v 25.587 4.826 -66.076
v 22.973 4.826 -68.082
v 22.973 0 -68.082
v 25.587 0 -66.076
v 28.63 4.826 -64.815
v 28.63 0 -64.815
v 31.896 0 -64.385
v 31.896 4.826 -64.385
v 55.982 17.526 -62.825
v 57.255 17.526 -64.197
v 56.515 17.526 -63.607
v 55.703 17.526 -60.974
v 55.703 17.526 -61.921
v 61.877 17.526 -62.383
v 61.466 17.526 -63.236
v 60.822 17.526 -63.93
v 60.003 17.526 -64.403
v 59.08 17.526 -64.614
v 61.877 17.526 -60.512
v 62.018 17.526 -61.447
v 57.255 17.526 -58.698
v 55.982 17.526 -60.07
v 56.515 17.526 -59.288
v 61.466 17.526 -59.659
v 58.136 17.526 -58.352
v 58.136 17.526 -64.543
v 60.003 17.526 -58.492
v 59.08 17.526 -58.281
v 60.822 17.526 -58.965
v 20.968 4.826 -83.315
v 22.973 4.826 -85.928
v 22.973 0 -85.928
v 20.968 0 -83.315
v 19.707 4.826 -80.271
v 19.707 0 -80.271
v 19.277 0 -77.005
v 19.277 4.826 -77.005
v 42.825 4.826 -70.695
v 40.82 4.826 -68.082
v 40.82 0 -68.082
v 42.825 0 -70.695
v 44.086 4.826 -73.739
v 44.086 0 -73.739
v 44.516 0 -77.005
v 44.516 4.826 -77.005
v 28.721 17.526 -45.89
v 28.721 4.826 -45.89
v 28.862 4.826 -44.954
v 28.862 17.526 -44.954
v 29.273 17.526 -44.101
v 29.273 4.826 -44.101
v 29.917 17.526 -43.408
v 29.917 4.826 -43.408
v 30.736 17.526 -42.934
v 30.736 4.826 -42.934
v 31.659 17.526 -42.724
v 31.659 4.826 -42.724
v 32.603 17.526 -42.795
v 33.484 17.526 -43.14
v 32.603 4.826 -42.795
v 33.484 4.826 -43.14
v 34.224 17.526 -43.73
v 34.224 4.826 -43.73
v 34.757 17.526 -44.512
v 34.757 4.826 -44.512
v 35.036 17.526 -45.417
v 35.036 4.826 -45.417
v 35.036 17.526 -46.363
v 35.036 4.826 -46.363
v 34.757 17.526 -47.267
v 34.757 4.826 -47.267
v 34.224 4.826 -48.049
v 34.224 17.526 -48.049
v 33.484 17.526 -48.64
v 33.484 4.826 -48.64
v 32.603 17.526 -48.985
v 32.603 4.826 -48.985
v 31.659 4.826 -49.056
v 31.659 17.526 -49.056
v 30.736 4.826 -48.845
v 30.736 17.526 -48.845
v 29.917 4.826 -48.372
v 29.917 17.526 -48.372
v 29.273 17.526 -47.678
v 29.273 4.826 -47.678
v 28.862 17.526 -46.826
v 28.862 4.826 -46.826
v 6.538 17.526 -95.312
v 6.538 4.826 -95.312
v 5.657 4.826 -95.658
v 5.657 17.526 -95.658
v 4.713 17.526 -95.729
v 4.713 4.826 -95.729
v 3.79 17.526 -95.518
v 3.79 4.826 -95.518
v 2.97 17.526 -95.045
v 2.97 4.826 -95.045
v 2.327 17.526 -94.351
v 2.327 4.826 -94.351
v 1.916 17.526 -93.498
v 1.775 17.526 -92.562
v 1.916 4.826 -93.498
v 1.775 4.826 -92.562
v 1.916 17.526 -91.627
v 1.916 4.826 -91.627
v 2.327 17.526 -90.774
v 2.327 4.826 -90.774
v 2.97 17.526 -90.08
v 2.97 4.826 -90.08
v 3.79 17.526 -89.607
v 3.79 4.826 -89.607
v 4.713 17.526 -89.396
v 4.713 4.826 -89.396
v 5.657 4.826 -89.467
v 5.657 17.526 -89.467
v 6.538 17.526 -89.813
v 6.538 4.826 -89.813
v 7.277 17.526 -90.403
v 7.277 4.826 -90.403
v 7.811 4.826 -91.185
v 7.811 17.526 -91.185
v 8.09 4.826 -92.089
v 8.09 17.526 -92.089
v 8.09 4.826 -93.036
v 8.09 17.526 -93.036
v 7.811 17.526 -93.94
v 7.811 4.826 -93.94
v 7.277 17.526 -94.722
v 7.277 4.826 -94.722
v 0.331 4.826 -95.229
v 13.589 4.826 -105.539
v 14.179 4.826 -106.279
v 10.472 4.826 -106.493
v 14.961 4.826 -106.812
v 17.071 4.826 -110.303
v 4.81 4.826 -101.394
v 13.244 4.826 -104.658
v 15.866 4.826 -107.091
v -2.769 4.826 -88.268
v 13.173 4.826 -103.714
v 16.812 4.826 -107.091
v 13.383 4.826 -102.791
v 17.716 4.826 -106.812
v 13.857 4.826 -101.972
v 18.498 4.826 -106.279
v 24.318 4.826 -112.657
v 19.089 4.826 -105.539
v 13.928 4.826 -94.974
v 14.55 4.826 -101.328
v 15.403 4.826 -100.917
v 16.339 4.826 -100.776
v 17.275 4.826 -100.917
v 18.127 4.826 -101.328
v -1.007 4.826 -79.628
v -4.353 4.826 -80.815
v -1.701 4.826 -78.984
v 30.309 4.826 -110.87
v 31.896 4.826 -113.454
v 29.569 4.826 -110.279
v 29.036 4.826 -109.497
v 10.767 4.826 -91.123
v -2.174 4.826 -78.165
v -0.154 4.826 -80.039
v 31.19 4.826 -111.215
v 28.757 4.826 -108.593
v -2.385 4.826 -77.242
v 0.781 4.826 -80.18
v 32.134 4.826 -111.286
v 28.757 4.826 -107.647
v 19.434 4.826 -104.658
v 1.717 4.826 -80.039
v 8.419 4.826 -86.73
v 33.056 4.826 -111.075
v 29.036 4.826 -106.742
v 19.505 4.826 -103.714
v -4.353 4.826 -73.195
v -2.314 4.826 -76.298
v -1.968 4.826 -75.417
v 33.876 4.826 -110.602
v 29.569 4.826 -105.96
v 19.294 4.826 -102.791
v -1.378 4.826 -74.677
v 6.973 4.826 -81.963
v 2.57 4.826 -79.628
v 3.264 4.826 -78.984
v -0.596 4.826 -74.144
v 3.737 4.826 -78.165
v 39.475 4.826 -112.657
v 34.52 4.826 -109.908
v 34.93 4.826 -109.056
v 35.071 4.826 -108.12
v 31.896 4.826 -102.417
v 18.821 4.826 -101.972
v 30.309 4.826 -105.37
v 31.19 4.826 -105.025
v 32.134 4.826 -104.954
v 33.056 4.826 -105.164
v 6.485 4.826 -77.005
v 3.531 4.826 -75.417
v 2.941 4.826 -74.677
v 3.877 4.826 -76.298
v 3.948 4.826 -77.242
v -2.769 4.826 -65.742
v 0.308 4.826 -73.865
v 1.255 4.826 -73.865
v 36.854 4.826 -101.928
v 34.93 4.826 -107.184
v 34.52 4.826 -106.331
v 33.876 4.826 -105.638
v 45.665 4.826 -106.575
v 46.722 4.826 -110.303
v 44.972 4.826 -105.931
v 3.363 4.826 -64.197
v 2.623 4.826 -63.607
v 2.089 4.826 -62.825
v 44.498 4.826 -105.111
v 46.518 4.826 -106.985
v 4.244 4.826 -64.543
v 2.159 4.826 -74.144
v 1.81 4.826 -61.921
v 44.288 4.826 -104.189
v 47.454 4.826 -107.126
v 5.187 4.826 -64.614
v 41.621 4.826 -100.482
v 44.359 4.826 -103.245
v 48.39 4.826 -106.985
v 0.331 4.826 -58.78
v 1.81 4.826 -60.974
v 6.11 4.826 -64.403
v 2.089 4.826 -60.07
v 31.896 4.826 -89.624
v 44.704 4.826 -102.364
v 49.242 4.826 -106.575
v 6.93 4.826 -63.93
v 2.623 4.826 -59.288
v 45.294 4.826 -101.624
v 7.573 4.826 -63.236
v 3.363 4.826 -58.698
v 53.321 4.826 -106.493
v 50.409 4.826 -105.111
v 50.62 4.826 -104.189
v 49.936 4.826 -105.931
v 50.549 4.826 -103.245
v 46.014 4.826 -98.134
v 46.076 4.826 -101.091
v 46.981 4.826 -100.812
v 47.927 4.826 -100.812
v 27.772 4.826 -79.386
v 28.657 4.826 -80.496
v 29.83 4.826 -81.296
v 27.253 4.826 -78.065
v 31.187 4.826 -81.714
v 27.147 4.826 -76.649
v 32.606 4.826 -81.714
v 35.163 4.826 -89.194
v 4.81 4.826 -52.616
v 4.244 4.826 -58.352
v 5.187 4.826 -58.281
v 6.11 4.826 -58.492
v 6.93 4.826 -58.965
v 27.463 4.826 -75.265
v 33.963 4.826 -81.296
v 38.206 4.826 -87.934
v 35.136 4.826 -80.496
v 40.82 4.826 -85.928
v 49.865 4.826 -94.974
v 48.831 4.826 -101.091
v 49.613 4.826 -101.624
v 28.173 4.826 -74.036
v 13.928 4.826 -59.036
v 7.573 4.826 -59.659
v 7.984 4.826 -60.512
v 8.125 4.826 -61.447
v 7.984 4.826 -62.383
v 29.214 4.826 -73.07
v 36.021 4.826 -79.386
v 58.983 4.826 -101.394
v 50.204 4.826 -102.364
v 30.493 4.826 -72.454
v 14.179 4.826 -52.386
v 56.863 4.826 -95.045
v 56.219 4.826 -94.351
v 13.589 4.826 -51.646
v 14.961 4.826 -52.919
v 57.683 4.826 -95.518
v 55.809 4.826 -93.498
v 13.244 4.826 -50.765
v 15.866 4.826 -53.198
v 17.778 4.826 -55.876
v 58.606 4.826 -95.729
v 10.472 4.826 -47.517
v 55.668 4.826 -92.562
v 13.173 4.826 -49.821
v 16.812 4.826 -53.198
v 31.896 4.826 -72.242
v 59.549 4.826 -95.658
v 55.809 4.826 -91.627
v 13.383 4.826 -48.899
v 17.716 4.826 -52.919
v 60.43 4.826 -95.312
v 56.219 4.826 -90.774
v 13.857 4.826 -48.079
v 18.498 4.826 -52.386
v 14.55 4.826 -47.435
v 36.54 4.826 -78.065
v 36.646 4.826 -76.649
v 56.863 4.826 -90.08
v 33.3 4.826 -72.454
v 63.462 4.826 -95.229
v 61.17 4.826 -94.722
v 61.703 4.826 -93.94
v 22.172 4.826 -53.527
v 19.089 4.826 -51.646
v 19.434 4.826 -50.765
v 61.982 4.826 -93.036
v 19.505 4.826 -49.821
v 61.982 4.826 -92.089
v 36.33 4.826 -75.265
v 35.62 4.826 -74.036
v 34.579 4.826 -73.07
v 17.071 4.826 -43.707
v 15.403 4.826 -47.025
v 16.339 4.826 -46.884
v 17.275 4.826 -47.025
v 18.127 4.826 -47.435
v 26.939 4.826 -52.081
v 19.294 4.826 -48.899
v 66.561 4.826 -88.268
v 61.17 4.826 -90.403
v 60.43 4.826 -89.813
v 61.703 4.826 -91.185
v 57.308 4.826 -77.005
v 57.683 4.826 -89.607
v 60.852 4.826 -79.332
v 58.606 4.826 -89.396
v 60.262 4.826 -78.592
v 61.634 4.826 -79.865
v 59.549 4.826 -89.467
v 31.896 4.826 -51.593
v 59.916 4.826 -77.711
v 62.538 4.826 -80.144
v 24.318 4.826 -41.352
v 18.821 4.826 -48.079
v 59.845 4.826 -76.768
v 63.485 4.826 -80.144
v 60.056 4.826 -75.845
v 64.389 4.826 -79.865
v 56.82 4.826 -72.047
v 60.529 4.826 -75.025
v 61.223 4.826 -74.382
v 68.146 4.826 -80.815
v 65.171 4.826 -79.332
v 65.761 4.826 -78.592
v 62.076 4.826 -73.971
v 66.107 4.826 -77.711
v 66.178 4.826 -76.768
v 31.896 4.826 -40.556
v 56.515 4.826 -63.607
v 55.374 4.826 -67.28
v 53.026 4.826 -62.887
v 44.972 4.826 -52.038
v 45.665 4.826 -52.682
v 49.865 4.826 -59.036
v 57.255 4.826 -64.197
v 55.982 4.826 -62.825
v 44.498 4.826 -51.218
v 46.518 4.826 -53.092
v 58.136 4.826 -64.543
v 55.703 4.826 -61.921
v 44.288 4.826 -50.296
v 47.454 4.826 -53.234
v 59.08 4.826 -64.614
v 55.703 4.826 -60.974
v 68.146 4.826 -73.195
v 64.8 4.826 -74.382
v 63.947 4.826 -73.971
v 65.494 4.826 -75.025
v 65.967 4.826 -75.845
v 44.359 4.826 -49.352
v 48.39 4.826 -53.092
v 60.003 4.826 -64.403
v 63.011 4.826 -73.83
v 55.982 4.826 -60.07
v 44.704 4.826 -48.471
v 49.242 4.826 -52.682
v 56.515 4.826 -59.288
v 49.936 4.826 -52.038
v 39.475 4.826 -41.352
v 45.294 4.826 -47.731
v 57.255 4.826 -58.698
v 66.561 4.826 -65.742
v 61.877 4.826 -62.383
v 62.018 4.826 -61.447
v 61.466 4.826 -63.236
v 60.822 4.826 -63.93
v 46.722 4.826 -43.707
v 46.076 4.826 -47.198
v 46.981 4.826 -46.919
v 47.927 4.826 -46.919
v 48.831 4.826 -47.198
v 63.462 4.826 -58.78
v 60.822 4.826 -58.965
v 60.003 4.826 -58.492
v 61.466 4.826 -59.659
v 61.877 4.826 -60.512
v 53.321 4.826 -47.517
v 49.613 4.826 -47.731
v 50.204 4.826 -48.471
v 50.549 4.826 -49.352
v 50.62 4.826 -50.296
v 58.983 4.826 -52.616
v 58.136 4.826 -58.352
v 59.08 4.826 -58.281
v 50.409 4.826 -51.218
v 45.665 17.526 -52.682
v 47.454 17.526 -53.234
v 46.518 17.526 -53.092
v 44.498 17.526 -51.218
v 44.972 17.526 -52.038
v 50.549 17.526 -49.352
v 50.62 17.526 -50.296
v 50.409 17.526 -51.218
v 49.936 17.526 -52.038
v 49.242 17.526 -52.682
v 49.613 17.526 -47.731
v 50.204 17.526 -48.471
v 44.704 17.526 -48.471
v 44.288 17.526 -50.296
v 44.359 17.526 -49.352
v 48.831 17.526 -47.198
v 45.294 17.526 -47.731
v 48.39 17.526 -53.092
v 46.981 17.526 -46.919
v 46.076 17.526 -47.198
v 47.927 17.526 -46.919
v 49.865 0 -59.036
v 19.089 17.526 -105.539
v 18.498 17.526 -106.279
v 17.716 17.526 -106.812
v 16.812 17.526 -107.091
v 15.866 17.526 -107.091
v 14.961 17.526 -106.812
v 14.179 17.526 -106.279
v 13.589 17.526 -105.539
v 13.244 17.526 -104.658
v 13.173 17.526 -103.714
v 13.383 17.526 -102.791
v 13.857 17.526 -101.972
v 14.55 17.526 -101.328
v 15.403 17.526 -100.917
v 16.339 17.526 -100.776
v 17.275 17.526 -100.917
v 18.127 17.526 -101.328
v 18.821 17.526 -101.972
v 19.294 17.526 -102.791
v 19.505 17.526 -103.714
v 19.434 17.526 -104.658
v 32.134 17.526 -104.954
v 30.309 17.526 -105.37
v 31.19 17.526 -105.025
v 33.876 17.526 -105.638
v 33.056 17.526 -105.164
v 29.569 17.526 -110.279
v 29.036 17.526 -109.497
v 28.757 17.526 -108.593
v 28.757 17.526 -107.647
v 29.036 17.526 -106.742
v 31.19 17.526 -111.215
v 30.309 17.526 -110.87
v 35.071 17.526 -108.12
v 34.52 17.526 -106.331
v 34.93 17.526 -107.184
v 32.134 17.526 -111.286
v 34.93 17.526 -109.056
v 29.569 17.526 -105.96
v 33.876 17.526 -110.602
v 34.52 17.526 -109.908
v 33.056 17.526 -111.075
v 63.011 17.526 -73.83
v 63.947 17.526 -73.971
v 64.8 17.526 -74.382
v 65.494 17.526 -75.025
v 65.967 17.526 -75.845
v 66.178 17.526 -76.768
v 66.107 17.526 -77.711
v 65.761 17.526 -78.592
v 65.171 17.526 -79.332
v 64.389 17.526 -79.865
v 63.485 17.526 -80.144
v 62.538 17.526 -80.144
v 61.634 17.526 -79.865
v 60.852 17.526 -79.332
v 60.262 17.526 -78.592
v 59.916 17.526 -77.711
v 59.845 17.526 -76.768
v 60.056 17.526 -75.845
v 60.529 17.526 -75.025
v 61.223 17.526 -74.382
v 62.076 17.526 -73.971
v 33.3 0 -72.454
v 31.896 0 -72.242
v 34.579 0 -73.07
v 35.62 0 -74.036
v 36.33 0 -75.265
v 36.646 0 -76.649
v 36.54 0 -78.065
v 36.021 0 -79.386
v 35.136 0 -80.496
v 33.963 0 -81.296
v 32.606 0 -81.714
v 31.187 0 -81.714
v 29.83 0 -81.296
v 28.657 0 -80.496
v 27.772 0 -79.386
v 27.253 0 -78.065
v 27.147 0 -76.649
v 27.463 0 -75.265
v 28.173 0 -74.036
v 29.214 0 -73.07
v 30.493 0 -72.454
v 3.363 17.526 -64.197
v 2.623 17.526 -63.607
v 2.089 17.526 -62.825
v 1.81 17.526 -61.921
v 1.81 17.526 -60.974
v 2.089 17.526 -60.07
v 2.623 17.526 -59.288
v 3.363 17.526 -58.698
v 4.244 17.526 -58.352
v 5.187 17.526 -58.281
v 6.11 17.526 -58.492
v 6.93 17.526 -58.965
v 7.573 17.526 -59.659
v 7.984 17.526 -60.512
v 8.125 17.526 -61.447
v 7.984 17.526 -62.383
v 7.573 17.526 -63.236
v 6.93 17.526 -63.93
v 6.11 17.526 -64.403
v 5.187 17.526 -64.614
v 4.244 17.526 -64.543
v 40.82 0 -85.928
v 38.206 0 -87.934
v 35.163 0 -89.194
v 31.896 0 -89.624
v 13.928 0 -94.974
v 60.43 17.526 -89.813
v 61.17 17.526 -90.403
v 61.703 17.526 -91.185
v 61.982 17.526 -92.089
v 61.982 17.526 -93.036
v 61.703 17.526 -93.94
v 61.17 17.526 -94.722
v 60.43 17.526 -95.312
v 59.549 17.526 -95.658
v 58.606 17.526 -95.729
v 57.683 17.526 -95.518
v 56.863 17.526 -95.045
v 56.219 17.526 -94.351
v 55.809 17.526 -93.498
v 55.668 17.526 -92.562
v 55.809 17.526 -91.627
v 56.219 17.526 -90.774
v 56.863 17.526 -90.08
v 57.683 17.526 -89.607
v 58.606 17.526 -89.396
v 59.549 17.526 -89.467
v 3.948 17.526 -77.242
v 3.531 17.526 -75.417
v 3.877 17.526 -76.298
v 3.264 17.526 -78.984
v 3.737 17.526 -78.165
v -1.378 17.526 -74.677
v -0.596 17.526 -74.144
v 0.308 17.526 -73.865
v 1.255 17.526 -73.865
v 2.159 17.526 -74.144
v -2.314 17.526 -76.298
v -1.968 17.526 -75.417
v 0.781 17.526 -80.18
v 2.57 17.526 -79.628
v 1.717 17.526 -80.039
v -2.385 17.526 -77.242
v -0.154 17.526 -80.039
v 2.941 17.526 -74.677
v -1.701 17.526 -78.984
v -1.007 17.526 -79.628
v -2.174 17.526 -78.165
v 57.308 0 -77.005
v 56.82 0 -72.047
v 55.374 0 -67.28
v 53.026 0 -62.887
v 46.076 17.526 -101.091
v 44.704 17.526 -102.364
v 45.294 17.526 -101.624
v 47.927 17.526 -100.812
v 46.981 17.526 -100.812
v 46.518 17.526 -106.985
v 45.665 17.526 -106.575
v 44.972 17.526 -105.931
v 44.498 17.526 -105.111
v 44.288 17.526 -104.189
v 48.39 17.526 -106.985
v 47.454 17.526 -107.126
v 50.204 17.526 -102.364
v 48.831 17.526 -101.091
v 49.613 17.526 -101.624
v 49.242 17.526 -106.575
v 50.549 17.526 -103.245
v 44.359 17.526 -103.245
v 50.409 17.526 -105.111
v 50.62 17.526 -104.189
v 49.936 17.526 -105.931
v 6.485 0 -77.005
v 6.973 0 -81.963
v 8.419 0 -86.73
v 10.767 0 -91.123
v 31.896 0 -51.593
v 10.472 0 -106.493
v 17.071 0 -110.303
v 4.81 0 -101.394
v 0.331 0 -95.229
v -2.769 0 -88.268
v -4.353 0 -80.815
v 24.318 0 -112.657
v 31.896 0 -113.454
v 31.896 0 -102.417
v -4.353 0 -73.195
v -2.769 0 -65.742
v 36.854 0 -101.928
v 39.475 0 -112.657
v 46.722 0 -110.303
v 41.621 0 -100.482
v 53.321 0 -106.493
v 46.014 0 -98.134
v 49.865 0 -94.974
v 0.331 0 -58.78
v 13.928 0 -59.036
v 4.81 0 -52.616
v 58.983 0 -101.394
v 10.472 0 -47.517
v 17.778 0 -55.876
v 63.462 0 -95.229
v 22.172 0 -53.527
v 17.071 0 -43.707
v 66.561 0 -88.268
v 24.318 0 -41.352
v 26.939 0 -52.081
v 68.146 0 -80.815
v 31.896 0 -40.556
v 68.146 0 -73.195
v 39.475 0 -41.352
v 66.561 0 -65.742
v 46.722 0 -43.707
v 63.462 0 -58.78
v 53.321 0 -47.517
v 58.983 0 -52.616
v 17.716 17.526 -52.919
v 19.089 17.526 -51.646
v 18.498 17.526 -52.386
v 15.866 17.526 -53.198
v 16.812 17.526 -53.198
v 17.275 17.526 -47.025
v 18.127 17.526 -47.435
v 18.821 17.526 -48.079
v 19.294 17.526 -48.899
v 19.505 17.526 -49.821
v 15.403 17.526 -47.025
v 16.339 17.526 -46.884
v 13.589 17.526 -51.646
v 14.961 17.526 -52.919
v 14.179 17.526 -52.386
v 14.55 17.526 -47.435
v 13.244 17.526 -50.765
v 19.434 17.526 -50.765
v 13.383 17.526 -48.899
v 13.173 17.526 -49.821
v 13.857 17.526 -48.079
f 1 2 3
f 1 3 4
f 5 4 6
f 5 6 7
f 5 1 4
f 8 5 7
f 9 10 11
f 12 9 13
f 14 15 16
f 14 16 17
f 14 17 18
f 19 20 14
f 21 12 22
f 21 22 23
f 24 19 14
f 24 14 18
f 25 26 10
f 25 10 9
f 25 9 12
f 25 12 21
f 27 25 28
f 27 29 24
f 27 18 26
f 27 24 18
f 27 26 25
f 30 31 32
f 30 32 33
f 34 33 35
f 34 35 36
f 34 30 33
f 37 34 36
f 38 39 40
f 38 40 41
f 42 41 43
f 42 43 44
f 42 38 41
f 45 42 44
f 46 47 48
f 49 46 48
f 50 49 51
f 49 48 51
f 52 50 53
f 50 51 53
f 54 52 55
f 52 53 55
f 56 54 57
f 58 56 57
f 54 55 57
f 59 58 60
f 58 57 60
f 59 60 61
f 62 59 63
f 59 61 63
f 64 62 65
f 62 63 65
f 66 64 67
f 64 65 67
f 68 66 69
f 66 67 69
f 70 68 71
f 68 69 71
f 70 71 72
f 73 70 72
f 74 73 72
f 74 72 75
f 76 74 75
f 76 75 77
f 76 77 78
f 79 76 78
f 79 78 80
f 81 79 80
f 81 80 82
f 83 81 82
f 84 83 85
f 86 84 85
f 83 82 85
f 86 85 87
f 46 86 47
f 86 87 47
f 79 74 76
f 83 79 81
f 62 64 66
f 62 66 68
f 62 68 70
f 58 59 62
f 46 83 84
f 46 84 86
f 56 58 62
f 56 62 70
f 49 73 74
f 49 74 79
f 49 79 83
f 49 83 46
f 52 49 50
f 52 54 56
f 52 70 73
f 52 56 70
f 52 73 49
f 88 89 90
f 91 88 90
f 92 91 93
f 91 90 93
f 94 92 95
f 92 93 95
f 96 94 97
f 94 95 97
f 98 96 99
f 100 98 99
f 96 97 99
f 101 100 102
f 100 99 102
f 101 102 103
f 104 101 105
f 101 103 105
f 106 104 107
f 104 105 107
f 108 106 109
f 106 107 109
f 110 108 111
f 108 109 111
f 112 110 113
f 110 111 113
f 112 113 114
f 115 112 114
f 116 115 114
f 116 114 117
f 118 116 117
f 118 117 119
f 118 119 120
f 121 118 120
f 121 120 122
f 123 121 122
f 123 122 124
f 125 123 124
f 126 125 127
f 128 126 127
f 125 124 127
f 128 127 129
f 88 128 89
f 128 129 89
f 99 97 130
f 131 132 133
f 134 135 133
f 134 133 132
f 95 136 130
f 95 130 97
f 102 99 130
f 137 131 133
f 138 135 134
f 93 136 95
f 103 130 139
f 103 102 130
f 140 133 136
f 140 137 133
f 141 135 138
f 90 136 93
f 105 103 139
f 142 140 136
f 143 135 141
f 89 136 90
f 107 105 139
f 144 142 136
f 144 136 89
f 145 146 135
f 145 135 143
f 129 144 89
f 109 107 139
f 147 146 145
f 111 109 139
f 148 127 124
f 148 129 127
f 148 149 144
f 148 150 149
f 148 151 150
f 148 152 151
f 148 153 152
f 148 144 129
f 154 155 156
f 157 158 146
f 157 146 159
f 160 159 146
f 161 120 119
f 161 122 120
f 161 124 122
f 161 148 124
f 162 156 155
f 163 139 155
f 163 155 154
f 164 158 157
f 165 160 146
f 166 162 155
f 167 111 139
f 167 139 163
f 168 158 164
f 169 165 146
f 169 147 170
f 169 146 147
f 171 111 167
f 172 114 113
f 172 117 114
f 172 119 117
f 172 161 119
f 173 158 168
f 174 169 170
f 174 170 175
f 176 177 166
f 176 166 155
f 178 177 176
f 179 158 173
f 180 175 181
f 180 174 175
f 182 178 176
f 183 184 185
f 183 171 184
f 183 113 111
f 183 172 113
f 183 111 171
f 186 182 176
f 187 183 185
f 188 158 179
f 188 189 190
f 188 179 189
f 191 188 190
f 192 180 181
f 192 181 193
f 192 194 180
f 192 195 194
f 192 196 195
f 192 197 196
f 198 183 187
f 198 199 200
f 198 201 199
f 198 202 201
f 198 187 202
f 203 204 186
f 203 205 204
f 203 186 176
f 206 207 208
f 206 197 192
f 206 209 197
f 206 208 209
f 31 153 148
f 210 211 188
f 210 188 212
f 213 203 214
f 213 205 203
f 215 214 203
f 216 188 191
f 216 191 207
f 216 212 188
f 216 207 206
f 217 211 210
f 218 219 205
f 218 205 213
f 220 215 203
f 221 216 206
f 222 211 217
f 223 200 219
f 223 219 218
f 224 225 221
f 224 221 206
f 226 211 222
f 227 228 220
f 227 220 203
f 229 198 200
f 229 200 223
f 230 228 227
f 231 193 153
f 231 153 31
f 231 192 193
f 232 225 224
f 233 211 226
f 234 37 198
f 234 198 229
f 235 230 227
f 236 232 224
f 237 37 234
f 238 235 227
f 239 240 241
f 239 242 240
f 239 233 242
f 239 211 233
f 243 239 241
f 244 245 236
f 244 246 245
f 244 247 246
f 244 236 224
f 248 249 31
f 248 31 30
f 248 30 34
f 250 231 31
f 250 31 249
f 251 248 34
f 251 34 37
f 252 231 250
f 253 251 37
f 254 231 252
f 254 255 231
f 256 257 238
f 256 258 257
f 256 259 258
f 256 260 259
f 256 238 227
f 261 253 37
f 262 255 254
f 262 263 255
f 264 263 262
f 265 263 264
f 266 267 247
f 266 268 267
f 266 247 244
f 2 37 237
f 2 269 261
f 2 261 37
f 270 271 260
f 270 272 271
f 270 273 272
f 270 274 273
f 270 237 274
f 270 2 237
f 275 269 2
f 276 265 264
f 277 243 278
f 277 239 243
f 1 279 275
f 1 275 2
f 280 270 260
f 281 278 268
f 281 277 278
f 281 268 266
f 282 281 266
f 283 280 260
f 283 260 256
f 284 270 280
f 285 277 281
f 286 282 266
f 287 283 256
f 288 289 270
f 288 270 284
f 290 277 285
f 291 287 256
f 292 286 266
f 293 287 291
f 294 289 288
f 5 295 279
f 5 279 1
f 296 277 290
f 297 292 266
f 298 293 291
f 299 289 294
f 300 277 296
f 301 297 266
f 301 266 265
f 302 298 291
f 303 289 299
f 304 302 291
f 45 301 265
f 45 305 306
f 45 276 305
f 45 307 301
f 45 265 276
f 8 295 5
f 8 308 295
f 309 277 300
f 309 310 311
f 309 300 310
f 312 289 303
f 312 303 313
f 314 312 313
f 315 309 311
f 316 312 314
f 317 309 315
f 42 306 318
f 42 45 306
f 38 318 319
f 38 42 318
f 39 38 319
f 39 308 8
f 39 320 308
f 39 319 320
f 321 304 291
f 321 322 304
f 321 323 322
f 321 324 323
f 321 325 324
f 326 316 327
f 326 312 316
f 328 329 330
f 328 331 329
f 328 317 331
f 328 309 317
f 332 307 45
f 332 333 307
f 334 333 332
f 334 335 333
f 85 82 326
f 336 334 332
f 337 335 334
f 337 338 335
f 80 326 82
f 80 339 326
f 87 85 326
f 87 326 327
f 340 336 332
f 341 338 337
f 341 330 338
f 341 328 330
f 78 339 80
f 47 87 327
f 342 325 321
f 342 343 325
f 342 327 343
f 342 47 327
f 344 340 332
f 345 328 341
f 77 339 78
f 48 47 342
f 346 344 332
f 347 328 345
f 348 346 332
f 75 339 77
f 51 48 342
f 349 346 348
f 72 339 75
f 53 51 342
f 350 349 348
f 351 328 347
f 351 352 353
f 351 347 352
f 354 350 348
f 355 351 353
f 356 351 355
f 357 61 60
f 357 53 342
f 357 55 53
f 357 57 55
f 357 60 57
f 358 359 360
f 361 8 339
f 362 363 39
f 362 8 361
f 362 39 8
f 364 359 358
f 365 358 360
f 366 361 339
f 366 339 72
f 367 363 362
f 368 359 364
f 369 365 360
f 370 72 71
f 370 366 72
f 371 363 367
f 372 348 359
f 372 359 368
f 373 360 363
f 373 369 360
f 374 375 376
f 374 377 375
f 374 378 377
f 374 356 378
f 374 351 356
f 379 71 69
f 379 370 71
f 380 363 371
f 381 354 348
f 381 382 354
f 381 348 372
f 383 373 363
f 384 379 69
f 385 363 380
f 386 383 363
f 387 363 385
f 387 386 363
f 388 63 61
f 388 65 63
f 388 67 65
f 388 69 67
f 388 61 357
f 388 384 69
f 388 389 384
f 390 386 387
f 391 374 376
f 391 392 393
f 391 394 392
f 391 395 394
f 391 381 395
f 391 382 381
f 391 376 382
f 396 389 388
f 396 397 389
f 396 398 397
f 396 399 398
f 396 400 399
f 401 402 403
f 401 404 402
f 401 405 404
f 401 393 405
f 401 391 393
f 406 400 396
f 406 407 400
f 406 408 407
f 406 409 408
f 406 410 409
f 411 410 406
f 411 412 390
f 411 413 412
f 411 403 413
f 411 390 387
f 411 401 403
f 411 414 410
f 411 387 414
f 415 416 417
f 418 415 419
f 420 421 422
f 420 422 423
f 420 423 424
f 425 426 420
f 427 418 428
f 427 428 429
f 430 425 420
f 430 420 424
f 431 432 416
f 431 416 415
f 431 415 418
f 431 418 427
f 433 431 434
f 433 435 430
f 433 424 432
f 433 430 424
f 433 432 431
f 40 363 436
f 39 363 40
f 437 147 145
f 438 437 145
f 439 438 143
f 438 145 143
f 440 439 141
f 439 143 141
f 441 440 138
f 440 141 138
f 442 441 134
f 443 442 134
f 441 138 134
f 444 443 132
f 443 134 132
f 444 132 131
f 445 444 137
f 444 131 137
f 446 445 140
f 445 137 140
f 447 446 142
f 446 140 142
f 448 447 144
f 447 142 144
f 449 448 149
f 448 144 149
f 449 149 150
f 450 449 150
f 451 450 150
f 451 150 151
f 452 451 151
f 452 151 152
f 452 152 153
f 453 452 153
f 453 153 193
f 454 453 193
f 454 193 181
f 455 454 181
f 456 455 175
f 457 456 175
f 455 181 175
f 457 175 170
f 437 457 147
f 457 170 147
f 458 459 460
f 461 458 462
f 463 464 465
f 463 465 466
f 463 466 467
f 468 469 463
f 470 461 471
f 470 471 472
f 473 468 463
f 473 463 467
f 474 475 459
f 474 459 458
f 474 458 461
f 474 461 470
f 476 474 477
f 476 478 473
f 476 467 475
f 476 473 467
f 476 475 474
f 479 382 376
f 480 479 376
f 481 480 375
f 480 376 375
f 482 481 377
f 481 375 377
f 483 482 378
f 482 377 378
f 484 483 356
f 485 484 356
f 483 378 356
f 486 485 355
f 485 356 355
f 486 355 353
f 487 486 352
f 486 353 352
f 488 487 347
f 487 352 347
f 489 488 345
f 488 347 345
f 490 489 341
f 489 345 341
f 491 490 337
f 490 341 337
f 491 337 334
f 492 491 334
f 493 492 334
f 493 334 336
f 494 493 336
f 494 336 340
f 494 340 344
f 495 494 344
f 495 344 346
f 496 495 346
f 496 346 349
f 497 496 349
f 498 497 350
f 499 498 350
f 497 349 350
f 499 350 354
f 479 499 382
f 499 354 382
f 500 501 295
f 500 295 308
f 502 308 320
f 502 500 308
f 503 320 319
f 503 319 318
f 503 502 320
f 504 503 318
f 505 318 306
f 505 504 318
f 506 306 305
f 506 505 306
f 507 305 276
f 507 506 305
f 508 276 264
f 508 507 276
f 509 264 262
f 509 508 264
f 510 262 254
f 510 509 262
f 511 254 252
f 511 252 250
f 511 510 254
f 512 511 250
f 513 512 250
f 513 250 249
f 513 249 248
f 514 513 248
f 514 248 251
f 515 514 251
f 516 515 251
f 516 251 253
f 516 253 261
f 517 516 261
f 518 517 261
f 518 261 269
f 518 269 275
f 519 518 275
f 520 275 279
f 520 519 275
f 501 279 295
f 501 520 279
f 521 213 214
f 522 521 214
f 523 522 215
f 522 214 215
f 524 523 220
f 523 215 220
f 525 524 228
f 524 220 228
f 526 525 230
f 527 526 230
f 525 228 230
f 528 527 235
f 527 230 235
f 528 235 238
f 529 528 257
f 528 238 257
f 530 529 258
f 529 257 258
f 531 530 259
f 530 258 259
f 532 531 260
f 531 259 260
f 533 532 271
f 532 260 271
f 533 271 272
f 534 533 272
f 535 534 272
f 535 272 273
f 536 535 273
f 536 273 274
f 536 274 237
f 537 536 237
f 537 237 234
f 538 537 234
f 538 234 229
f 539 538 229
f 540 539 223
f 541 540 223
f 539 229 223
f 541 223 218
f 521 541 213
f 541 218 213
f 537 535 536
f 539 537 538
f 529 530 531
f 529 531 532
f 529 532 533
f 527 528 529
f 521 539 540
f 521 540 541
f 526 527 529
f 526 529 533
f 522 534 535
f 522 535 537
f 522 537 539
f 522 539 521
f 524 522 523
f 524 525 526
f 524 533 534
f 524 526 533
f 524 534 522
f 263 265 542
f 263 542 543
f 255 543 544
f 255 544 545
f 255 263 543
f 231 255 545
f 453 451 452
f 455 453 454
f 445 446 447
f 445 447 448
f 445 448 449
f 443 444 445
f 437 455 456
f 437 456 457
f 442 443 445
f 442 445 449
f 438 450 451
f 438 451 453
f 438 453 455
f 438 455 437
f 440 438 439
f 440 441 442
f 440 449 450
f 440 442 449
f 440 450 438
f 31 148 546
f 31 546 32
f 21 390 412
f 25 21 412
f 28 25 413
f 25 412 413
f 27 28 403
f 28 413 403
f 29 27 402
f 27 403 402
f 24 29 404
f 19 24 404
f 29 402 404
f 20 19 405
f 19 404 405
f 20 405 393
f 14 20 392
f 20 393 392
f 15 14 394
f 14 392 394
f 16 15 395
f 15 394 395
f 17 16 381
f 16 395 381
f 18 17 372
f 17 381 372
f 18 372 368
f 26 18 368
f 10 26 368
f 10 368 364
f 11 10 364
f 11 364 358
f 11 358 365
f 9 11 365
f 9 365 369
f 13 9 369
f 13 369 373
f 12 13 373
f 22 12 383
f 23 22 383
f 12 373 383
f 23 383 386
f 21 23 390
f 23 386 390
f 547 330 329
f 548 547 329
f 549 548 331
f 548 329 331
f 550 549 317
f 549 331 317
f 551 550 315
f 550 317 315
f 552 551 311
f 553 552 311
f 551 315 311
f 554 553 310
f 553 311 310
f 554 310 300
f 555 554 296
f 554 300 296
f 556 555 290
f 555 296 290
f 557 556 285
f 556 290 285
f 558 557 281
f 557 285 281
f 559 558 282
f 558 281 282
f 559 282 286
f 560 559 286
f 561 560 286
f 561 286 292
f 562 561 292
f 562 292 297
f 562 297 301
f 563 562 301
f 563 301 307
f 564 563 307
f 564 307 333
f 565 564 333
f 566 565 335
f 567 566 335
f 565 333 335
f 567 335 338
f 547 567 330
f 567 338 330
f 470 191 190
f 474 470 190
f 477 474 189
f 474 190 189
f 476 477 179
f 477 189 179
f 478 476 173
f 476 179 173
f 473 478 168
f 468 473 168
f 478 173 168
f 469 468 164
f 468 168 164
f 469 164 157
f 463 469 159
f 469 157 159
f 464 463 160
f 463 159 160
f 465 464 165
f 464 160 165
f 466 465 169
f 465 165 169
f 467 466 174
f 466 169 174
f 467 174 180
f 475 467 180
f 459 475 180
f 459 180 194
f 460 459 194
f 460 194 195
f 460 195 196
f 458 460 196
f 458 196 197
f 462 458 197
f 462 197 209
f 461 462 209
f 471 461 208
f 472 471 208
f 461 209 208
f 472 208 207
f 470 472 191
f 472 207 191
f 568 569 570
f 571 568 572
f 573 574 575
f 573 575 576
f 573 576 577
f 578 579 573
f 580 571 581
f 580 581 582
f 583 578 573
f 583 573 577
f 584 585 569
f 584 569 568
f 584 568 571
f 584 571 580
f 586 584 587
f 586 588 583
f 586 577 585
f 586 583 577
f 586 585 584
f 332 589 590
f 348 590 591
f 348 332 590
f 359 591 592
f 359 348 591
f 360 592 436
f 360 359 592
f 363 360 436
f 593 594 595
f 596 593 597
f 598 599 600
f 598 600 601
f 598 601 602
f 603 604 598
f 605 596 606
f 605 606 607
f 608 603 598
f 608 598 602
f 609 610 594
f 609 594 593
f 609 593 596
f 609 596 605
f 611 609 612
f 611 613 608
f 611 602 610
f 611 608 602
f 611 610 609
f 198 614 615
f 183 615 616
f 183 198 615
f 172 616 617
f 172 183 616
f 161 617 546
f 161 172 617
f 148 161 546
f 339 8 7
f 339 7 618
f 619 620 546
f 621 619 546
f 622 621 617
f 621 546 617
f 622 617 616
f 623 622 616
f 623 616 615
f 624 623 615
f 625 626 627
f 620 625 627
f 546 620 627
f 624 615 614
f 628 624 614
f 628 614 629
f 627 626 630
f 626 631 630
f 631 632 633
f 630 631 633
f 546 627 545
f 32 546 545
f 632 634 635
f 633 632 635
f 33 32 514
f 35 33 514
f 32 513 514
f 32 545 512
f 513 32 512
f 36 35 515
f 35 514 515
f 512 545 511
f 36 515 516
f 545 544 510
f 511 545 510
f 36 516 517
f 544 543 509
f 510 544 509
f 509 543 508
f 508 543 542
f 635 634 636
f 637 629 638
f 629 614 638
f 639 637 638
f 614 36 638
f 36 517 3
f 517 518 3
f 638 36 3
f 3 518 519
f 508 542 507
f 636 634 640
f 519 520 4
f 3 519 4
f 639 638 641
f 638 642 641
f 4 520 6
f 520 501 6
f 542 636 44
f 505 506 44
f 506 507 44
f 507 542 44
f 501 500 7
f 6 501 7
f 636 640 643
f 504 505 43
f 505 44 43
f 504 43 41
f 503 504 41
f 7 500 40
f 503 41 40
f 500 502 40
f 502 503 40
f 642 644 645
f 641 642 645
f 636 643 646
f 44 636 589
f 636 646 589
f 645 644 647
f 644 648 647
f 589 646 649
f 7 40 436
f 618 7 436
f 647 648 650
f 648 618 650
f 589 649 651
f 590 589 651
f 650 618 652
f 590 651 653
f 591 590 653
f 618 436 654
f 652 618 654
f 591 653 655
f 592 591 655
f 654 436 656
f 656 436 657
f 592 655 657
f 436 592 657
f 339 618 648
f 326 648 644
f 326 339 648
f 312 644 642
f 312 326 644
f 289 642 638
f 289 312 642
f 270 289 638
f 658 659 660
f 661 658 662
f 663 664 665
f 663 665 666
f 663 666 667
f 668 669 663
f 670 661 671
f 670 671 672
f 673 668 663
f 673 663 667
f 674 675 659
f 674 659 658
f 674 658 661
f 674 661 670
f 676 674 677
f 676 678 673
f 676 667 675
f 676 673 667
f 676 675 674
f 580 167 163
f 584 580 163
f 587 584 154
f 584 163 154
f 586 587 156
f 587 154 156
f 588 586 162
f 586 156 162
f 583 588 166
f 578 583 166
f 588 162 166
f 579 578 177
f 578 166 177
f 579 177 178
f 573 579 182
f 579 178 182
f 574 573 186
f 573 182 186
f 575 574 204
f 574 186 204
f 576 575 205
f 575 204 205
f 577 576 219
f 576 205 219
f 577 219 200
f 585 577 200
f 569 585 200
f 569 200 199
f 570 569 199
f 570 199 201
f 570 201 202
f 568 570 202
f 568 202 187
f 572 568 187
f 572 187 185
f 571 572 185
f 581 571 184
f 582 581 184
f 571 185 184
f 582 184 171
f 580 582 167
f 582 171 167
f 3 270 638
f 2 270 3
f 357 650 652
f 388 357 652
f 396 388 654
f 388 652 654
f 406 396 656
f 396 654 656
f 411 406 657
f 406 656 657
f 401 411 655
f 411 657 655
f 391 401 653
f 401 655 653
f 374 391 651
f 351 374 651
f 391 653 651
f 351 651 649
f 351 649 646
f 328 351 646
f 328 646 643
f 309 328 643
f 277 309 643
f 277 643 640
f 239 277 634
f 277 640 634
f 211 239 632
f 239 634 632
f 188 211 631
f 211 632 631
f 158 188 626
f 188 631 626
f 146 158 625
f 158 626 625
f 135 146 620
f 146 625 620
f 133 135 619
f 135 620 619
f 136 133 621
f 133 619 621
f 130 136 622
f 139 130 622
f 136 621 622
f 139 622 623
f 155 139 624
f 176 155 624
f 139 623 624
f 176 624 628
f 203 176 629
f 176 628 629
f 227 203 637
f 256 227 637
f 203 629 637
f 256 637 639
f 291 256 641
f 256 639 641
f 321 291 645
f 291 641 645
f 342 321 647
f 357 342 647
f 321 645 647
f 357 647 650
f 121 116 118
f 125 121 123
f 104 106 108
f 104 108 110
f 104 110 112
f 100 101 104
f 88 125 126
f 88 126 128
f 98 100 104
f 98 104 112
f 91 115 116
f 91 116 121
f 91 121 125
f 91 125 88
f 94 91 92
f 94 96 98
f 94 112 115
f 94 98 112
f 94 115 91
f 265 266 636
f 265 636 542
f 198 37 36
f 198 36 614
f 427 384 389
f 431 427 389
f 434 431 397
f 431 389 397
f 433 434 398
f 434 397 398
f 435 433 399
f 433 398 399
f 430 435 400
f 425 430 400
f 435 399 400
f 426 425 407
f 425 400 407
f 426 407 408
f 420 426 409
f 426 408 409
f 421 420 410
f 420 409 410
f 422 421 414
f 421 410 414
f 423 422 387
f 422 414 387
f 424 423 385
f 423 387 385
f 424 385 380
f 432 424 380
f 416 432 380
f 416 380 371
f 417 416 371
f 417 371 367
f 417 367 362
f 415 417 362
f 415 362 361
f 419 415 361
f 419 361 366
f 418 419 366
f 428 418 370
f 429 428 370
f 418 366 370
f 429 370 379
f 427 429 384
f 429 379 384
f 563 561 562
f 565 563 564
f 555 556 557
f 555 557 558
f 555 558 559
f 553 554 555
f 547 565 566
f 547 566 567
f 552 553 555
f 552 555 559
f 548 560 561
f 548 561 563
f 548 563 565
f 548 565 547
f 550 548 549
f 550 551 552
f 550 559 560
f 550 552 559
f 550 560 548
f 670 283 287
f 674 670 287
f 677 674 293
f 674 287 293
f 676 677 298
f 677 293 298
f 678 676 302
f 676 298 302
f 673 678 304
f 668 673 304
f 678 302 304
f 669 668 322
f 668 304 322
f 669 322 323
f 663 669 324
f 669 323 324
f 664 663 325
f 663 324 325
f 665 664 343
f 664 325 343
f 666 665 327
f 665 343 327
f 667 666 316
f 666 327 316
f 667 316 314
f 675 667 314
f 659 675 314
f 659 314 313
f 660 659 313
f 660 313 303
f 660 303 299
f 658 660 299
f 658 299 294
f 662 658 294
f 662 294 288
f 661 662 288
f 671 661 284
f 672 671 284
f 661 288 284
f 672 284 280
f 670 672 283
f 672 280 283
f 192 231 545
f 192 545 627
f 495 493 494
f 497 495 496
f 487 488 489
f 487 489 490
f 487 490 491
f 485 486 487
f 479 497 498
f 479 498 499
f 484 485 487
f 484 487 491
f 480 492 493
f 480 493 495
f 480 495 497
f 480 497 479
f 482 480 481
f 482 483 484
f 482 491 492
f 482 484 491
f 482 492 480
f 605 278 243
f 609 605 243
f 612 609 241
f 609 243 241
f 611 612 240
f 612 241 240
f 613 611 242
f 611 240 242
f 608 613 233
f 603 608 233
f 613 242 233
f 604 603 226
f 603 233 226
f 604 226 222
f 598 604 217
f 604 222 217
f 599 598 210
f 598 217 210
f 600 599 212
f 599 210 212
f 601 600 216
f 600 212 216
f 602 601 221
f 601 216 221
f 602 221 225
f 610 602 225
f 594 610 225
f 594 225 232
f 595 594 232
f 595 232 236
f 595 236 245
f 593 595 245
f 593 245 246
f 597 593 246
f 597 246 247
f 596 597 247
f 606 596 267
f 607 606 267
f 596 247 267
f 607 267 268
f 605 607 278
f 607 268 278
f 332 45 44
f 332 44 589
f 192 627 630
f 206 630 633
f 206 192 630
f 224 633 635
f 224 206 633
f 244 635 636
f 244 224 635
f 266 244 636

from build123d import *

# Parameters (mm, degrees)
SKETCH1_R         = 36.449
SKETCH1_R_2       = 4.7625
EXTRUDE1_DEPTH    = 4.826
SKETCH2_R         = 3.175
EXTRUDE2_DEPTH    = 12.7
CIRPATTERN1_COUNT = 12
EXTRUDE3_DEPTH    = 19.05
CIRPATTERN2_COUNT = 4


with BuildPart() as part:
    # Sketch1 → Extrude1 (new body)
    with BuildSketch(Plane(origin=(0, 0, 0), x_dir=(1, 0, 0), z_dir=(0, 1, 0))):
        with Locations(Location((31.896411717, 77.004913135, 0), (0, 0, 270))):  # turned: the seam where the file's is
            Circle(SKETCH1_R)
        with Locations(Location((31.896411717, 77.004913135, 0), (0, 0, 270))):  # turned: the seam where the file's is
            Circle(SKETCH1_R_2, mode=Mode.SUBTRACT)
    extrude(amount=EXTRUDE1_DEPTH)

    # Sketch2 → Extrude2 (add)
    with BuildSketch(Plane(origin=(0, 4.826, 0), x_dir=(1, 0, 0), z_dir=(0, 1, 0))):
        with Locations(Location((63.011411717, 77.004913135, 0), (0, 0, 270))):  # turned: the seam where the file's is
            Circle(SKETCH2_R)
    extrude2 = extrude(amount=EXTRUDE2_DEPTH)

    # CirPattern1: Extrude2 ×12 about axis
    cirpattern1_axis = Axis((31.896411717, 0, -77.004913135), (0, 1, 0))
    for i in range(1, CIRPATTERN1_COUNT):
        add(extrude2.rotate(cirpattern1_axis, i * 360 / CIRPATTERN1_COUNT))

    # Sketch3 → Extrude3 (cut)
    with BuildSketch(Plane(origin=(0, 4.826, 0), x_dir=(1, 0, 0), z_dir=(0, 1, 0))):
        with BuildLine():
            Line((31.896411717, 89.62444152), (31.896411717, 102.416748175))
            ThreePointArc((31.896411717, 102.416748175), (41.621099973, 100.482387412), (49.865292596, 94.973794014))
            Line((49.865292596, 94.973794014), (40.819765813, 85.928267231))
            ThreePointArc((40.819765813, 85.928267231), (36.725696154, 88.66383712), (31.896411717, 89.62444152))
        make_face()
    extrude3 = extrude(amount=-EXTRUDE3_DEPTH, mode=Mode.SUBTRACT)

    # CirPattern2: Extrude3 ×4 about axis
    cirpattern2_axis = Axis((31.896411717, 4.826, -77.004913135), (0, 1, 0))
    for i in range(1, CIRPATTERN2_COUNT):
        add(extrude3.rotate(cirpattern2_axis, i * 360 / CIRPATTERN2_COUNT), mode=Mode.SUBTRACT)


solid = part.part
